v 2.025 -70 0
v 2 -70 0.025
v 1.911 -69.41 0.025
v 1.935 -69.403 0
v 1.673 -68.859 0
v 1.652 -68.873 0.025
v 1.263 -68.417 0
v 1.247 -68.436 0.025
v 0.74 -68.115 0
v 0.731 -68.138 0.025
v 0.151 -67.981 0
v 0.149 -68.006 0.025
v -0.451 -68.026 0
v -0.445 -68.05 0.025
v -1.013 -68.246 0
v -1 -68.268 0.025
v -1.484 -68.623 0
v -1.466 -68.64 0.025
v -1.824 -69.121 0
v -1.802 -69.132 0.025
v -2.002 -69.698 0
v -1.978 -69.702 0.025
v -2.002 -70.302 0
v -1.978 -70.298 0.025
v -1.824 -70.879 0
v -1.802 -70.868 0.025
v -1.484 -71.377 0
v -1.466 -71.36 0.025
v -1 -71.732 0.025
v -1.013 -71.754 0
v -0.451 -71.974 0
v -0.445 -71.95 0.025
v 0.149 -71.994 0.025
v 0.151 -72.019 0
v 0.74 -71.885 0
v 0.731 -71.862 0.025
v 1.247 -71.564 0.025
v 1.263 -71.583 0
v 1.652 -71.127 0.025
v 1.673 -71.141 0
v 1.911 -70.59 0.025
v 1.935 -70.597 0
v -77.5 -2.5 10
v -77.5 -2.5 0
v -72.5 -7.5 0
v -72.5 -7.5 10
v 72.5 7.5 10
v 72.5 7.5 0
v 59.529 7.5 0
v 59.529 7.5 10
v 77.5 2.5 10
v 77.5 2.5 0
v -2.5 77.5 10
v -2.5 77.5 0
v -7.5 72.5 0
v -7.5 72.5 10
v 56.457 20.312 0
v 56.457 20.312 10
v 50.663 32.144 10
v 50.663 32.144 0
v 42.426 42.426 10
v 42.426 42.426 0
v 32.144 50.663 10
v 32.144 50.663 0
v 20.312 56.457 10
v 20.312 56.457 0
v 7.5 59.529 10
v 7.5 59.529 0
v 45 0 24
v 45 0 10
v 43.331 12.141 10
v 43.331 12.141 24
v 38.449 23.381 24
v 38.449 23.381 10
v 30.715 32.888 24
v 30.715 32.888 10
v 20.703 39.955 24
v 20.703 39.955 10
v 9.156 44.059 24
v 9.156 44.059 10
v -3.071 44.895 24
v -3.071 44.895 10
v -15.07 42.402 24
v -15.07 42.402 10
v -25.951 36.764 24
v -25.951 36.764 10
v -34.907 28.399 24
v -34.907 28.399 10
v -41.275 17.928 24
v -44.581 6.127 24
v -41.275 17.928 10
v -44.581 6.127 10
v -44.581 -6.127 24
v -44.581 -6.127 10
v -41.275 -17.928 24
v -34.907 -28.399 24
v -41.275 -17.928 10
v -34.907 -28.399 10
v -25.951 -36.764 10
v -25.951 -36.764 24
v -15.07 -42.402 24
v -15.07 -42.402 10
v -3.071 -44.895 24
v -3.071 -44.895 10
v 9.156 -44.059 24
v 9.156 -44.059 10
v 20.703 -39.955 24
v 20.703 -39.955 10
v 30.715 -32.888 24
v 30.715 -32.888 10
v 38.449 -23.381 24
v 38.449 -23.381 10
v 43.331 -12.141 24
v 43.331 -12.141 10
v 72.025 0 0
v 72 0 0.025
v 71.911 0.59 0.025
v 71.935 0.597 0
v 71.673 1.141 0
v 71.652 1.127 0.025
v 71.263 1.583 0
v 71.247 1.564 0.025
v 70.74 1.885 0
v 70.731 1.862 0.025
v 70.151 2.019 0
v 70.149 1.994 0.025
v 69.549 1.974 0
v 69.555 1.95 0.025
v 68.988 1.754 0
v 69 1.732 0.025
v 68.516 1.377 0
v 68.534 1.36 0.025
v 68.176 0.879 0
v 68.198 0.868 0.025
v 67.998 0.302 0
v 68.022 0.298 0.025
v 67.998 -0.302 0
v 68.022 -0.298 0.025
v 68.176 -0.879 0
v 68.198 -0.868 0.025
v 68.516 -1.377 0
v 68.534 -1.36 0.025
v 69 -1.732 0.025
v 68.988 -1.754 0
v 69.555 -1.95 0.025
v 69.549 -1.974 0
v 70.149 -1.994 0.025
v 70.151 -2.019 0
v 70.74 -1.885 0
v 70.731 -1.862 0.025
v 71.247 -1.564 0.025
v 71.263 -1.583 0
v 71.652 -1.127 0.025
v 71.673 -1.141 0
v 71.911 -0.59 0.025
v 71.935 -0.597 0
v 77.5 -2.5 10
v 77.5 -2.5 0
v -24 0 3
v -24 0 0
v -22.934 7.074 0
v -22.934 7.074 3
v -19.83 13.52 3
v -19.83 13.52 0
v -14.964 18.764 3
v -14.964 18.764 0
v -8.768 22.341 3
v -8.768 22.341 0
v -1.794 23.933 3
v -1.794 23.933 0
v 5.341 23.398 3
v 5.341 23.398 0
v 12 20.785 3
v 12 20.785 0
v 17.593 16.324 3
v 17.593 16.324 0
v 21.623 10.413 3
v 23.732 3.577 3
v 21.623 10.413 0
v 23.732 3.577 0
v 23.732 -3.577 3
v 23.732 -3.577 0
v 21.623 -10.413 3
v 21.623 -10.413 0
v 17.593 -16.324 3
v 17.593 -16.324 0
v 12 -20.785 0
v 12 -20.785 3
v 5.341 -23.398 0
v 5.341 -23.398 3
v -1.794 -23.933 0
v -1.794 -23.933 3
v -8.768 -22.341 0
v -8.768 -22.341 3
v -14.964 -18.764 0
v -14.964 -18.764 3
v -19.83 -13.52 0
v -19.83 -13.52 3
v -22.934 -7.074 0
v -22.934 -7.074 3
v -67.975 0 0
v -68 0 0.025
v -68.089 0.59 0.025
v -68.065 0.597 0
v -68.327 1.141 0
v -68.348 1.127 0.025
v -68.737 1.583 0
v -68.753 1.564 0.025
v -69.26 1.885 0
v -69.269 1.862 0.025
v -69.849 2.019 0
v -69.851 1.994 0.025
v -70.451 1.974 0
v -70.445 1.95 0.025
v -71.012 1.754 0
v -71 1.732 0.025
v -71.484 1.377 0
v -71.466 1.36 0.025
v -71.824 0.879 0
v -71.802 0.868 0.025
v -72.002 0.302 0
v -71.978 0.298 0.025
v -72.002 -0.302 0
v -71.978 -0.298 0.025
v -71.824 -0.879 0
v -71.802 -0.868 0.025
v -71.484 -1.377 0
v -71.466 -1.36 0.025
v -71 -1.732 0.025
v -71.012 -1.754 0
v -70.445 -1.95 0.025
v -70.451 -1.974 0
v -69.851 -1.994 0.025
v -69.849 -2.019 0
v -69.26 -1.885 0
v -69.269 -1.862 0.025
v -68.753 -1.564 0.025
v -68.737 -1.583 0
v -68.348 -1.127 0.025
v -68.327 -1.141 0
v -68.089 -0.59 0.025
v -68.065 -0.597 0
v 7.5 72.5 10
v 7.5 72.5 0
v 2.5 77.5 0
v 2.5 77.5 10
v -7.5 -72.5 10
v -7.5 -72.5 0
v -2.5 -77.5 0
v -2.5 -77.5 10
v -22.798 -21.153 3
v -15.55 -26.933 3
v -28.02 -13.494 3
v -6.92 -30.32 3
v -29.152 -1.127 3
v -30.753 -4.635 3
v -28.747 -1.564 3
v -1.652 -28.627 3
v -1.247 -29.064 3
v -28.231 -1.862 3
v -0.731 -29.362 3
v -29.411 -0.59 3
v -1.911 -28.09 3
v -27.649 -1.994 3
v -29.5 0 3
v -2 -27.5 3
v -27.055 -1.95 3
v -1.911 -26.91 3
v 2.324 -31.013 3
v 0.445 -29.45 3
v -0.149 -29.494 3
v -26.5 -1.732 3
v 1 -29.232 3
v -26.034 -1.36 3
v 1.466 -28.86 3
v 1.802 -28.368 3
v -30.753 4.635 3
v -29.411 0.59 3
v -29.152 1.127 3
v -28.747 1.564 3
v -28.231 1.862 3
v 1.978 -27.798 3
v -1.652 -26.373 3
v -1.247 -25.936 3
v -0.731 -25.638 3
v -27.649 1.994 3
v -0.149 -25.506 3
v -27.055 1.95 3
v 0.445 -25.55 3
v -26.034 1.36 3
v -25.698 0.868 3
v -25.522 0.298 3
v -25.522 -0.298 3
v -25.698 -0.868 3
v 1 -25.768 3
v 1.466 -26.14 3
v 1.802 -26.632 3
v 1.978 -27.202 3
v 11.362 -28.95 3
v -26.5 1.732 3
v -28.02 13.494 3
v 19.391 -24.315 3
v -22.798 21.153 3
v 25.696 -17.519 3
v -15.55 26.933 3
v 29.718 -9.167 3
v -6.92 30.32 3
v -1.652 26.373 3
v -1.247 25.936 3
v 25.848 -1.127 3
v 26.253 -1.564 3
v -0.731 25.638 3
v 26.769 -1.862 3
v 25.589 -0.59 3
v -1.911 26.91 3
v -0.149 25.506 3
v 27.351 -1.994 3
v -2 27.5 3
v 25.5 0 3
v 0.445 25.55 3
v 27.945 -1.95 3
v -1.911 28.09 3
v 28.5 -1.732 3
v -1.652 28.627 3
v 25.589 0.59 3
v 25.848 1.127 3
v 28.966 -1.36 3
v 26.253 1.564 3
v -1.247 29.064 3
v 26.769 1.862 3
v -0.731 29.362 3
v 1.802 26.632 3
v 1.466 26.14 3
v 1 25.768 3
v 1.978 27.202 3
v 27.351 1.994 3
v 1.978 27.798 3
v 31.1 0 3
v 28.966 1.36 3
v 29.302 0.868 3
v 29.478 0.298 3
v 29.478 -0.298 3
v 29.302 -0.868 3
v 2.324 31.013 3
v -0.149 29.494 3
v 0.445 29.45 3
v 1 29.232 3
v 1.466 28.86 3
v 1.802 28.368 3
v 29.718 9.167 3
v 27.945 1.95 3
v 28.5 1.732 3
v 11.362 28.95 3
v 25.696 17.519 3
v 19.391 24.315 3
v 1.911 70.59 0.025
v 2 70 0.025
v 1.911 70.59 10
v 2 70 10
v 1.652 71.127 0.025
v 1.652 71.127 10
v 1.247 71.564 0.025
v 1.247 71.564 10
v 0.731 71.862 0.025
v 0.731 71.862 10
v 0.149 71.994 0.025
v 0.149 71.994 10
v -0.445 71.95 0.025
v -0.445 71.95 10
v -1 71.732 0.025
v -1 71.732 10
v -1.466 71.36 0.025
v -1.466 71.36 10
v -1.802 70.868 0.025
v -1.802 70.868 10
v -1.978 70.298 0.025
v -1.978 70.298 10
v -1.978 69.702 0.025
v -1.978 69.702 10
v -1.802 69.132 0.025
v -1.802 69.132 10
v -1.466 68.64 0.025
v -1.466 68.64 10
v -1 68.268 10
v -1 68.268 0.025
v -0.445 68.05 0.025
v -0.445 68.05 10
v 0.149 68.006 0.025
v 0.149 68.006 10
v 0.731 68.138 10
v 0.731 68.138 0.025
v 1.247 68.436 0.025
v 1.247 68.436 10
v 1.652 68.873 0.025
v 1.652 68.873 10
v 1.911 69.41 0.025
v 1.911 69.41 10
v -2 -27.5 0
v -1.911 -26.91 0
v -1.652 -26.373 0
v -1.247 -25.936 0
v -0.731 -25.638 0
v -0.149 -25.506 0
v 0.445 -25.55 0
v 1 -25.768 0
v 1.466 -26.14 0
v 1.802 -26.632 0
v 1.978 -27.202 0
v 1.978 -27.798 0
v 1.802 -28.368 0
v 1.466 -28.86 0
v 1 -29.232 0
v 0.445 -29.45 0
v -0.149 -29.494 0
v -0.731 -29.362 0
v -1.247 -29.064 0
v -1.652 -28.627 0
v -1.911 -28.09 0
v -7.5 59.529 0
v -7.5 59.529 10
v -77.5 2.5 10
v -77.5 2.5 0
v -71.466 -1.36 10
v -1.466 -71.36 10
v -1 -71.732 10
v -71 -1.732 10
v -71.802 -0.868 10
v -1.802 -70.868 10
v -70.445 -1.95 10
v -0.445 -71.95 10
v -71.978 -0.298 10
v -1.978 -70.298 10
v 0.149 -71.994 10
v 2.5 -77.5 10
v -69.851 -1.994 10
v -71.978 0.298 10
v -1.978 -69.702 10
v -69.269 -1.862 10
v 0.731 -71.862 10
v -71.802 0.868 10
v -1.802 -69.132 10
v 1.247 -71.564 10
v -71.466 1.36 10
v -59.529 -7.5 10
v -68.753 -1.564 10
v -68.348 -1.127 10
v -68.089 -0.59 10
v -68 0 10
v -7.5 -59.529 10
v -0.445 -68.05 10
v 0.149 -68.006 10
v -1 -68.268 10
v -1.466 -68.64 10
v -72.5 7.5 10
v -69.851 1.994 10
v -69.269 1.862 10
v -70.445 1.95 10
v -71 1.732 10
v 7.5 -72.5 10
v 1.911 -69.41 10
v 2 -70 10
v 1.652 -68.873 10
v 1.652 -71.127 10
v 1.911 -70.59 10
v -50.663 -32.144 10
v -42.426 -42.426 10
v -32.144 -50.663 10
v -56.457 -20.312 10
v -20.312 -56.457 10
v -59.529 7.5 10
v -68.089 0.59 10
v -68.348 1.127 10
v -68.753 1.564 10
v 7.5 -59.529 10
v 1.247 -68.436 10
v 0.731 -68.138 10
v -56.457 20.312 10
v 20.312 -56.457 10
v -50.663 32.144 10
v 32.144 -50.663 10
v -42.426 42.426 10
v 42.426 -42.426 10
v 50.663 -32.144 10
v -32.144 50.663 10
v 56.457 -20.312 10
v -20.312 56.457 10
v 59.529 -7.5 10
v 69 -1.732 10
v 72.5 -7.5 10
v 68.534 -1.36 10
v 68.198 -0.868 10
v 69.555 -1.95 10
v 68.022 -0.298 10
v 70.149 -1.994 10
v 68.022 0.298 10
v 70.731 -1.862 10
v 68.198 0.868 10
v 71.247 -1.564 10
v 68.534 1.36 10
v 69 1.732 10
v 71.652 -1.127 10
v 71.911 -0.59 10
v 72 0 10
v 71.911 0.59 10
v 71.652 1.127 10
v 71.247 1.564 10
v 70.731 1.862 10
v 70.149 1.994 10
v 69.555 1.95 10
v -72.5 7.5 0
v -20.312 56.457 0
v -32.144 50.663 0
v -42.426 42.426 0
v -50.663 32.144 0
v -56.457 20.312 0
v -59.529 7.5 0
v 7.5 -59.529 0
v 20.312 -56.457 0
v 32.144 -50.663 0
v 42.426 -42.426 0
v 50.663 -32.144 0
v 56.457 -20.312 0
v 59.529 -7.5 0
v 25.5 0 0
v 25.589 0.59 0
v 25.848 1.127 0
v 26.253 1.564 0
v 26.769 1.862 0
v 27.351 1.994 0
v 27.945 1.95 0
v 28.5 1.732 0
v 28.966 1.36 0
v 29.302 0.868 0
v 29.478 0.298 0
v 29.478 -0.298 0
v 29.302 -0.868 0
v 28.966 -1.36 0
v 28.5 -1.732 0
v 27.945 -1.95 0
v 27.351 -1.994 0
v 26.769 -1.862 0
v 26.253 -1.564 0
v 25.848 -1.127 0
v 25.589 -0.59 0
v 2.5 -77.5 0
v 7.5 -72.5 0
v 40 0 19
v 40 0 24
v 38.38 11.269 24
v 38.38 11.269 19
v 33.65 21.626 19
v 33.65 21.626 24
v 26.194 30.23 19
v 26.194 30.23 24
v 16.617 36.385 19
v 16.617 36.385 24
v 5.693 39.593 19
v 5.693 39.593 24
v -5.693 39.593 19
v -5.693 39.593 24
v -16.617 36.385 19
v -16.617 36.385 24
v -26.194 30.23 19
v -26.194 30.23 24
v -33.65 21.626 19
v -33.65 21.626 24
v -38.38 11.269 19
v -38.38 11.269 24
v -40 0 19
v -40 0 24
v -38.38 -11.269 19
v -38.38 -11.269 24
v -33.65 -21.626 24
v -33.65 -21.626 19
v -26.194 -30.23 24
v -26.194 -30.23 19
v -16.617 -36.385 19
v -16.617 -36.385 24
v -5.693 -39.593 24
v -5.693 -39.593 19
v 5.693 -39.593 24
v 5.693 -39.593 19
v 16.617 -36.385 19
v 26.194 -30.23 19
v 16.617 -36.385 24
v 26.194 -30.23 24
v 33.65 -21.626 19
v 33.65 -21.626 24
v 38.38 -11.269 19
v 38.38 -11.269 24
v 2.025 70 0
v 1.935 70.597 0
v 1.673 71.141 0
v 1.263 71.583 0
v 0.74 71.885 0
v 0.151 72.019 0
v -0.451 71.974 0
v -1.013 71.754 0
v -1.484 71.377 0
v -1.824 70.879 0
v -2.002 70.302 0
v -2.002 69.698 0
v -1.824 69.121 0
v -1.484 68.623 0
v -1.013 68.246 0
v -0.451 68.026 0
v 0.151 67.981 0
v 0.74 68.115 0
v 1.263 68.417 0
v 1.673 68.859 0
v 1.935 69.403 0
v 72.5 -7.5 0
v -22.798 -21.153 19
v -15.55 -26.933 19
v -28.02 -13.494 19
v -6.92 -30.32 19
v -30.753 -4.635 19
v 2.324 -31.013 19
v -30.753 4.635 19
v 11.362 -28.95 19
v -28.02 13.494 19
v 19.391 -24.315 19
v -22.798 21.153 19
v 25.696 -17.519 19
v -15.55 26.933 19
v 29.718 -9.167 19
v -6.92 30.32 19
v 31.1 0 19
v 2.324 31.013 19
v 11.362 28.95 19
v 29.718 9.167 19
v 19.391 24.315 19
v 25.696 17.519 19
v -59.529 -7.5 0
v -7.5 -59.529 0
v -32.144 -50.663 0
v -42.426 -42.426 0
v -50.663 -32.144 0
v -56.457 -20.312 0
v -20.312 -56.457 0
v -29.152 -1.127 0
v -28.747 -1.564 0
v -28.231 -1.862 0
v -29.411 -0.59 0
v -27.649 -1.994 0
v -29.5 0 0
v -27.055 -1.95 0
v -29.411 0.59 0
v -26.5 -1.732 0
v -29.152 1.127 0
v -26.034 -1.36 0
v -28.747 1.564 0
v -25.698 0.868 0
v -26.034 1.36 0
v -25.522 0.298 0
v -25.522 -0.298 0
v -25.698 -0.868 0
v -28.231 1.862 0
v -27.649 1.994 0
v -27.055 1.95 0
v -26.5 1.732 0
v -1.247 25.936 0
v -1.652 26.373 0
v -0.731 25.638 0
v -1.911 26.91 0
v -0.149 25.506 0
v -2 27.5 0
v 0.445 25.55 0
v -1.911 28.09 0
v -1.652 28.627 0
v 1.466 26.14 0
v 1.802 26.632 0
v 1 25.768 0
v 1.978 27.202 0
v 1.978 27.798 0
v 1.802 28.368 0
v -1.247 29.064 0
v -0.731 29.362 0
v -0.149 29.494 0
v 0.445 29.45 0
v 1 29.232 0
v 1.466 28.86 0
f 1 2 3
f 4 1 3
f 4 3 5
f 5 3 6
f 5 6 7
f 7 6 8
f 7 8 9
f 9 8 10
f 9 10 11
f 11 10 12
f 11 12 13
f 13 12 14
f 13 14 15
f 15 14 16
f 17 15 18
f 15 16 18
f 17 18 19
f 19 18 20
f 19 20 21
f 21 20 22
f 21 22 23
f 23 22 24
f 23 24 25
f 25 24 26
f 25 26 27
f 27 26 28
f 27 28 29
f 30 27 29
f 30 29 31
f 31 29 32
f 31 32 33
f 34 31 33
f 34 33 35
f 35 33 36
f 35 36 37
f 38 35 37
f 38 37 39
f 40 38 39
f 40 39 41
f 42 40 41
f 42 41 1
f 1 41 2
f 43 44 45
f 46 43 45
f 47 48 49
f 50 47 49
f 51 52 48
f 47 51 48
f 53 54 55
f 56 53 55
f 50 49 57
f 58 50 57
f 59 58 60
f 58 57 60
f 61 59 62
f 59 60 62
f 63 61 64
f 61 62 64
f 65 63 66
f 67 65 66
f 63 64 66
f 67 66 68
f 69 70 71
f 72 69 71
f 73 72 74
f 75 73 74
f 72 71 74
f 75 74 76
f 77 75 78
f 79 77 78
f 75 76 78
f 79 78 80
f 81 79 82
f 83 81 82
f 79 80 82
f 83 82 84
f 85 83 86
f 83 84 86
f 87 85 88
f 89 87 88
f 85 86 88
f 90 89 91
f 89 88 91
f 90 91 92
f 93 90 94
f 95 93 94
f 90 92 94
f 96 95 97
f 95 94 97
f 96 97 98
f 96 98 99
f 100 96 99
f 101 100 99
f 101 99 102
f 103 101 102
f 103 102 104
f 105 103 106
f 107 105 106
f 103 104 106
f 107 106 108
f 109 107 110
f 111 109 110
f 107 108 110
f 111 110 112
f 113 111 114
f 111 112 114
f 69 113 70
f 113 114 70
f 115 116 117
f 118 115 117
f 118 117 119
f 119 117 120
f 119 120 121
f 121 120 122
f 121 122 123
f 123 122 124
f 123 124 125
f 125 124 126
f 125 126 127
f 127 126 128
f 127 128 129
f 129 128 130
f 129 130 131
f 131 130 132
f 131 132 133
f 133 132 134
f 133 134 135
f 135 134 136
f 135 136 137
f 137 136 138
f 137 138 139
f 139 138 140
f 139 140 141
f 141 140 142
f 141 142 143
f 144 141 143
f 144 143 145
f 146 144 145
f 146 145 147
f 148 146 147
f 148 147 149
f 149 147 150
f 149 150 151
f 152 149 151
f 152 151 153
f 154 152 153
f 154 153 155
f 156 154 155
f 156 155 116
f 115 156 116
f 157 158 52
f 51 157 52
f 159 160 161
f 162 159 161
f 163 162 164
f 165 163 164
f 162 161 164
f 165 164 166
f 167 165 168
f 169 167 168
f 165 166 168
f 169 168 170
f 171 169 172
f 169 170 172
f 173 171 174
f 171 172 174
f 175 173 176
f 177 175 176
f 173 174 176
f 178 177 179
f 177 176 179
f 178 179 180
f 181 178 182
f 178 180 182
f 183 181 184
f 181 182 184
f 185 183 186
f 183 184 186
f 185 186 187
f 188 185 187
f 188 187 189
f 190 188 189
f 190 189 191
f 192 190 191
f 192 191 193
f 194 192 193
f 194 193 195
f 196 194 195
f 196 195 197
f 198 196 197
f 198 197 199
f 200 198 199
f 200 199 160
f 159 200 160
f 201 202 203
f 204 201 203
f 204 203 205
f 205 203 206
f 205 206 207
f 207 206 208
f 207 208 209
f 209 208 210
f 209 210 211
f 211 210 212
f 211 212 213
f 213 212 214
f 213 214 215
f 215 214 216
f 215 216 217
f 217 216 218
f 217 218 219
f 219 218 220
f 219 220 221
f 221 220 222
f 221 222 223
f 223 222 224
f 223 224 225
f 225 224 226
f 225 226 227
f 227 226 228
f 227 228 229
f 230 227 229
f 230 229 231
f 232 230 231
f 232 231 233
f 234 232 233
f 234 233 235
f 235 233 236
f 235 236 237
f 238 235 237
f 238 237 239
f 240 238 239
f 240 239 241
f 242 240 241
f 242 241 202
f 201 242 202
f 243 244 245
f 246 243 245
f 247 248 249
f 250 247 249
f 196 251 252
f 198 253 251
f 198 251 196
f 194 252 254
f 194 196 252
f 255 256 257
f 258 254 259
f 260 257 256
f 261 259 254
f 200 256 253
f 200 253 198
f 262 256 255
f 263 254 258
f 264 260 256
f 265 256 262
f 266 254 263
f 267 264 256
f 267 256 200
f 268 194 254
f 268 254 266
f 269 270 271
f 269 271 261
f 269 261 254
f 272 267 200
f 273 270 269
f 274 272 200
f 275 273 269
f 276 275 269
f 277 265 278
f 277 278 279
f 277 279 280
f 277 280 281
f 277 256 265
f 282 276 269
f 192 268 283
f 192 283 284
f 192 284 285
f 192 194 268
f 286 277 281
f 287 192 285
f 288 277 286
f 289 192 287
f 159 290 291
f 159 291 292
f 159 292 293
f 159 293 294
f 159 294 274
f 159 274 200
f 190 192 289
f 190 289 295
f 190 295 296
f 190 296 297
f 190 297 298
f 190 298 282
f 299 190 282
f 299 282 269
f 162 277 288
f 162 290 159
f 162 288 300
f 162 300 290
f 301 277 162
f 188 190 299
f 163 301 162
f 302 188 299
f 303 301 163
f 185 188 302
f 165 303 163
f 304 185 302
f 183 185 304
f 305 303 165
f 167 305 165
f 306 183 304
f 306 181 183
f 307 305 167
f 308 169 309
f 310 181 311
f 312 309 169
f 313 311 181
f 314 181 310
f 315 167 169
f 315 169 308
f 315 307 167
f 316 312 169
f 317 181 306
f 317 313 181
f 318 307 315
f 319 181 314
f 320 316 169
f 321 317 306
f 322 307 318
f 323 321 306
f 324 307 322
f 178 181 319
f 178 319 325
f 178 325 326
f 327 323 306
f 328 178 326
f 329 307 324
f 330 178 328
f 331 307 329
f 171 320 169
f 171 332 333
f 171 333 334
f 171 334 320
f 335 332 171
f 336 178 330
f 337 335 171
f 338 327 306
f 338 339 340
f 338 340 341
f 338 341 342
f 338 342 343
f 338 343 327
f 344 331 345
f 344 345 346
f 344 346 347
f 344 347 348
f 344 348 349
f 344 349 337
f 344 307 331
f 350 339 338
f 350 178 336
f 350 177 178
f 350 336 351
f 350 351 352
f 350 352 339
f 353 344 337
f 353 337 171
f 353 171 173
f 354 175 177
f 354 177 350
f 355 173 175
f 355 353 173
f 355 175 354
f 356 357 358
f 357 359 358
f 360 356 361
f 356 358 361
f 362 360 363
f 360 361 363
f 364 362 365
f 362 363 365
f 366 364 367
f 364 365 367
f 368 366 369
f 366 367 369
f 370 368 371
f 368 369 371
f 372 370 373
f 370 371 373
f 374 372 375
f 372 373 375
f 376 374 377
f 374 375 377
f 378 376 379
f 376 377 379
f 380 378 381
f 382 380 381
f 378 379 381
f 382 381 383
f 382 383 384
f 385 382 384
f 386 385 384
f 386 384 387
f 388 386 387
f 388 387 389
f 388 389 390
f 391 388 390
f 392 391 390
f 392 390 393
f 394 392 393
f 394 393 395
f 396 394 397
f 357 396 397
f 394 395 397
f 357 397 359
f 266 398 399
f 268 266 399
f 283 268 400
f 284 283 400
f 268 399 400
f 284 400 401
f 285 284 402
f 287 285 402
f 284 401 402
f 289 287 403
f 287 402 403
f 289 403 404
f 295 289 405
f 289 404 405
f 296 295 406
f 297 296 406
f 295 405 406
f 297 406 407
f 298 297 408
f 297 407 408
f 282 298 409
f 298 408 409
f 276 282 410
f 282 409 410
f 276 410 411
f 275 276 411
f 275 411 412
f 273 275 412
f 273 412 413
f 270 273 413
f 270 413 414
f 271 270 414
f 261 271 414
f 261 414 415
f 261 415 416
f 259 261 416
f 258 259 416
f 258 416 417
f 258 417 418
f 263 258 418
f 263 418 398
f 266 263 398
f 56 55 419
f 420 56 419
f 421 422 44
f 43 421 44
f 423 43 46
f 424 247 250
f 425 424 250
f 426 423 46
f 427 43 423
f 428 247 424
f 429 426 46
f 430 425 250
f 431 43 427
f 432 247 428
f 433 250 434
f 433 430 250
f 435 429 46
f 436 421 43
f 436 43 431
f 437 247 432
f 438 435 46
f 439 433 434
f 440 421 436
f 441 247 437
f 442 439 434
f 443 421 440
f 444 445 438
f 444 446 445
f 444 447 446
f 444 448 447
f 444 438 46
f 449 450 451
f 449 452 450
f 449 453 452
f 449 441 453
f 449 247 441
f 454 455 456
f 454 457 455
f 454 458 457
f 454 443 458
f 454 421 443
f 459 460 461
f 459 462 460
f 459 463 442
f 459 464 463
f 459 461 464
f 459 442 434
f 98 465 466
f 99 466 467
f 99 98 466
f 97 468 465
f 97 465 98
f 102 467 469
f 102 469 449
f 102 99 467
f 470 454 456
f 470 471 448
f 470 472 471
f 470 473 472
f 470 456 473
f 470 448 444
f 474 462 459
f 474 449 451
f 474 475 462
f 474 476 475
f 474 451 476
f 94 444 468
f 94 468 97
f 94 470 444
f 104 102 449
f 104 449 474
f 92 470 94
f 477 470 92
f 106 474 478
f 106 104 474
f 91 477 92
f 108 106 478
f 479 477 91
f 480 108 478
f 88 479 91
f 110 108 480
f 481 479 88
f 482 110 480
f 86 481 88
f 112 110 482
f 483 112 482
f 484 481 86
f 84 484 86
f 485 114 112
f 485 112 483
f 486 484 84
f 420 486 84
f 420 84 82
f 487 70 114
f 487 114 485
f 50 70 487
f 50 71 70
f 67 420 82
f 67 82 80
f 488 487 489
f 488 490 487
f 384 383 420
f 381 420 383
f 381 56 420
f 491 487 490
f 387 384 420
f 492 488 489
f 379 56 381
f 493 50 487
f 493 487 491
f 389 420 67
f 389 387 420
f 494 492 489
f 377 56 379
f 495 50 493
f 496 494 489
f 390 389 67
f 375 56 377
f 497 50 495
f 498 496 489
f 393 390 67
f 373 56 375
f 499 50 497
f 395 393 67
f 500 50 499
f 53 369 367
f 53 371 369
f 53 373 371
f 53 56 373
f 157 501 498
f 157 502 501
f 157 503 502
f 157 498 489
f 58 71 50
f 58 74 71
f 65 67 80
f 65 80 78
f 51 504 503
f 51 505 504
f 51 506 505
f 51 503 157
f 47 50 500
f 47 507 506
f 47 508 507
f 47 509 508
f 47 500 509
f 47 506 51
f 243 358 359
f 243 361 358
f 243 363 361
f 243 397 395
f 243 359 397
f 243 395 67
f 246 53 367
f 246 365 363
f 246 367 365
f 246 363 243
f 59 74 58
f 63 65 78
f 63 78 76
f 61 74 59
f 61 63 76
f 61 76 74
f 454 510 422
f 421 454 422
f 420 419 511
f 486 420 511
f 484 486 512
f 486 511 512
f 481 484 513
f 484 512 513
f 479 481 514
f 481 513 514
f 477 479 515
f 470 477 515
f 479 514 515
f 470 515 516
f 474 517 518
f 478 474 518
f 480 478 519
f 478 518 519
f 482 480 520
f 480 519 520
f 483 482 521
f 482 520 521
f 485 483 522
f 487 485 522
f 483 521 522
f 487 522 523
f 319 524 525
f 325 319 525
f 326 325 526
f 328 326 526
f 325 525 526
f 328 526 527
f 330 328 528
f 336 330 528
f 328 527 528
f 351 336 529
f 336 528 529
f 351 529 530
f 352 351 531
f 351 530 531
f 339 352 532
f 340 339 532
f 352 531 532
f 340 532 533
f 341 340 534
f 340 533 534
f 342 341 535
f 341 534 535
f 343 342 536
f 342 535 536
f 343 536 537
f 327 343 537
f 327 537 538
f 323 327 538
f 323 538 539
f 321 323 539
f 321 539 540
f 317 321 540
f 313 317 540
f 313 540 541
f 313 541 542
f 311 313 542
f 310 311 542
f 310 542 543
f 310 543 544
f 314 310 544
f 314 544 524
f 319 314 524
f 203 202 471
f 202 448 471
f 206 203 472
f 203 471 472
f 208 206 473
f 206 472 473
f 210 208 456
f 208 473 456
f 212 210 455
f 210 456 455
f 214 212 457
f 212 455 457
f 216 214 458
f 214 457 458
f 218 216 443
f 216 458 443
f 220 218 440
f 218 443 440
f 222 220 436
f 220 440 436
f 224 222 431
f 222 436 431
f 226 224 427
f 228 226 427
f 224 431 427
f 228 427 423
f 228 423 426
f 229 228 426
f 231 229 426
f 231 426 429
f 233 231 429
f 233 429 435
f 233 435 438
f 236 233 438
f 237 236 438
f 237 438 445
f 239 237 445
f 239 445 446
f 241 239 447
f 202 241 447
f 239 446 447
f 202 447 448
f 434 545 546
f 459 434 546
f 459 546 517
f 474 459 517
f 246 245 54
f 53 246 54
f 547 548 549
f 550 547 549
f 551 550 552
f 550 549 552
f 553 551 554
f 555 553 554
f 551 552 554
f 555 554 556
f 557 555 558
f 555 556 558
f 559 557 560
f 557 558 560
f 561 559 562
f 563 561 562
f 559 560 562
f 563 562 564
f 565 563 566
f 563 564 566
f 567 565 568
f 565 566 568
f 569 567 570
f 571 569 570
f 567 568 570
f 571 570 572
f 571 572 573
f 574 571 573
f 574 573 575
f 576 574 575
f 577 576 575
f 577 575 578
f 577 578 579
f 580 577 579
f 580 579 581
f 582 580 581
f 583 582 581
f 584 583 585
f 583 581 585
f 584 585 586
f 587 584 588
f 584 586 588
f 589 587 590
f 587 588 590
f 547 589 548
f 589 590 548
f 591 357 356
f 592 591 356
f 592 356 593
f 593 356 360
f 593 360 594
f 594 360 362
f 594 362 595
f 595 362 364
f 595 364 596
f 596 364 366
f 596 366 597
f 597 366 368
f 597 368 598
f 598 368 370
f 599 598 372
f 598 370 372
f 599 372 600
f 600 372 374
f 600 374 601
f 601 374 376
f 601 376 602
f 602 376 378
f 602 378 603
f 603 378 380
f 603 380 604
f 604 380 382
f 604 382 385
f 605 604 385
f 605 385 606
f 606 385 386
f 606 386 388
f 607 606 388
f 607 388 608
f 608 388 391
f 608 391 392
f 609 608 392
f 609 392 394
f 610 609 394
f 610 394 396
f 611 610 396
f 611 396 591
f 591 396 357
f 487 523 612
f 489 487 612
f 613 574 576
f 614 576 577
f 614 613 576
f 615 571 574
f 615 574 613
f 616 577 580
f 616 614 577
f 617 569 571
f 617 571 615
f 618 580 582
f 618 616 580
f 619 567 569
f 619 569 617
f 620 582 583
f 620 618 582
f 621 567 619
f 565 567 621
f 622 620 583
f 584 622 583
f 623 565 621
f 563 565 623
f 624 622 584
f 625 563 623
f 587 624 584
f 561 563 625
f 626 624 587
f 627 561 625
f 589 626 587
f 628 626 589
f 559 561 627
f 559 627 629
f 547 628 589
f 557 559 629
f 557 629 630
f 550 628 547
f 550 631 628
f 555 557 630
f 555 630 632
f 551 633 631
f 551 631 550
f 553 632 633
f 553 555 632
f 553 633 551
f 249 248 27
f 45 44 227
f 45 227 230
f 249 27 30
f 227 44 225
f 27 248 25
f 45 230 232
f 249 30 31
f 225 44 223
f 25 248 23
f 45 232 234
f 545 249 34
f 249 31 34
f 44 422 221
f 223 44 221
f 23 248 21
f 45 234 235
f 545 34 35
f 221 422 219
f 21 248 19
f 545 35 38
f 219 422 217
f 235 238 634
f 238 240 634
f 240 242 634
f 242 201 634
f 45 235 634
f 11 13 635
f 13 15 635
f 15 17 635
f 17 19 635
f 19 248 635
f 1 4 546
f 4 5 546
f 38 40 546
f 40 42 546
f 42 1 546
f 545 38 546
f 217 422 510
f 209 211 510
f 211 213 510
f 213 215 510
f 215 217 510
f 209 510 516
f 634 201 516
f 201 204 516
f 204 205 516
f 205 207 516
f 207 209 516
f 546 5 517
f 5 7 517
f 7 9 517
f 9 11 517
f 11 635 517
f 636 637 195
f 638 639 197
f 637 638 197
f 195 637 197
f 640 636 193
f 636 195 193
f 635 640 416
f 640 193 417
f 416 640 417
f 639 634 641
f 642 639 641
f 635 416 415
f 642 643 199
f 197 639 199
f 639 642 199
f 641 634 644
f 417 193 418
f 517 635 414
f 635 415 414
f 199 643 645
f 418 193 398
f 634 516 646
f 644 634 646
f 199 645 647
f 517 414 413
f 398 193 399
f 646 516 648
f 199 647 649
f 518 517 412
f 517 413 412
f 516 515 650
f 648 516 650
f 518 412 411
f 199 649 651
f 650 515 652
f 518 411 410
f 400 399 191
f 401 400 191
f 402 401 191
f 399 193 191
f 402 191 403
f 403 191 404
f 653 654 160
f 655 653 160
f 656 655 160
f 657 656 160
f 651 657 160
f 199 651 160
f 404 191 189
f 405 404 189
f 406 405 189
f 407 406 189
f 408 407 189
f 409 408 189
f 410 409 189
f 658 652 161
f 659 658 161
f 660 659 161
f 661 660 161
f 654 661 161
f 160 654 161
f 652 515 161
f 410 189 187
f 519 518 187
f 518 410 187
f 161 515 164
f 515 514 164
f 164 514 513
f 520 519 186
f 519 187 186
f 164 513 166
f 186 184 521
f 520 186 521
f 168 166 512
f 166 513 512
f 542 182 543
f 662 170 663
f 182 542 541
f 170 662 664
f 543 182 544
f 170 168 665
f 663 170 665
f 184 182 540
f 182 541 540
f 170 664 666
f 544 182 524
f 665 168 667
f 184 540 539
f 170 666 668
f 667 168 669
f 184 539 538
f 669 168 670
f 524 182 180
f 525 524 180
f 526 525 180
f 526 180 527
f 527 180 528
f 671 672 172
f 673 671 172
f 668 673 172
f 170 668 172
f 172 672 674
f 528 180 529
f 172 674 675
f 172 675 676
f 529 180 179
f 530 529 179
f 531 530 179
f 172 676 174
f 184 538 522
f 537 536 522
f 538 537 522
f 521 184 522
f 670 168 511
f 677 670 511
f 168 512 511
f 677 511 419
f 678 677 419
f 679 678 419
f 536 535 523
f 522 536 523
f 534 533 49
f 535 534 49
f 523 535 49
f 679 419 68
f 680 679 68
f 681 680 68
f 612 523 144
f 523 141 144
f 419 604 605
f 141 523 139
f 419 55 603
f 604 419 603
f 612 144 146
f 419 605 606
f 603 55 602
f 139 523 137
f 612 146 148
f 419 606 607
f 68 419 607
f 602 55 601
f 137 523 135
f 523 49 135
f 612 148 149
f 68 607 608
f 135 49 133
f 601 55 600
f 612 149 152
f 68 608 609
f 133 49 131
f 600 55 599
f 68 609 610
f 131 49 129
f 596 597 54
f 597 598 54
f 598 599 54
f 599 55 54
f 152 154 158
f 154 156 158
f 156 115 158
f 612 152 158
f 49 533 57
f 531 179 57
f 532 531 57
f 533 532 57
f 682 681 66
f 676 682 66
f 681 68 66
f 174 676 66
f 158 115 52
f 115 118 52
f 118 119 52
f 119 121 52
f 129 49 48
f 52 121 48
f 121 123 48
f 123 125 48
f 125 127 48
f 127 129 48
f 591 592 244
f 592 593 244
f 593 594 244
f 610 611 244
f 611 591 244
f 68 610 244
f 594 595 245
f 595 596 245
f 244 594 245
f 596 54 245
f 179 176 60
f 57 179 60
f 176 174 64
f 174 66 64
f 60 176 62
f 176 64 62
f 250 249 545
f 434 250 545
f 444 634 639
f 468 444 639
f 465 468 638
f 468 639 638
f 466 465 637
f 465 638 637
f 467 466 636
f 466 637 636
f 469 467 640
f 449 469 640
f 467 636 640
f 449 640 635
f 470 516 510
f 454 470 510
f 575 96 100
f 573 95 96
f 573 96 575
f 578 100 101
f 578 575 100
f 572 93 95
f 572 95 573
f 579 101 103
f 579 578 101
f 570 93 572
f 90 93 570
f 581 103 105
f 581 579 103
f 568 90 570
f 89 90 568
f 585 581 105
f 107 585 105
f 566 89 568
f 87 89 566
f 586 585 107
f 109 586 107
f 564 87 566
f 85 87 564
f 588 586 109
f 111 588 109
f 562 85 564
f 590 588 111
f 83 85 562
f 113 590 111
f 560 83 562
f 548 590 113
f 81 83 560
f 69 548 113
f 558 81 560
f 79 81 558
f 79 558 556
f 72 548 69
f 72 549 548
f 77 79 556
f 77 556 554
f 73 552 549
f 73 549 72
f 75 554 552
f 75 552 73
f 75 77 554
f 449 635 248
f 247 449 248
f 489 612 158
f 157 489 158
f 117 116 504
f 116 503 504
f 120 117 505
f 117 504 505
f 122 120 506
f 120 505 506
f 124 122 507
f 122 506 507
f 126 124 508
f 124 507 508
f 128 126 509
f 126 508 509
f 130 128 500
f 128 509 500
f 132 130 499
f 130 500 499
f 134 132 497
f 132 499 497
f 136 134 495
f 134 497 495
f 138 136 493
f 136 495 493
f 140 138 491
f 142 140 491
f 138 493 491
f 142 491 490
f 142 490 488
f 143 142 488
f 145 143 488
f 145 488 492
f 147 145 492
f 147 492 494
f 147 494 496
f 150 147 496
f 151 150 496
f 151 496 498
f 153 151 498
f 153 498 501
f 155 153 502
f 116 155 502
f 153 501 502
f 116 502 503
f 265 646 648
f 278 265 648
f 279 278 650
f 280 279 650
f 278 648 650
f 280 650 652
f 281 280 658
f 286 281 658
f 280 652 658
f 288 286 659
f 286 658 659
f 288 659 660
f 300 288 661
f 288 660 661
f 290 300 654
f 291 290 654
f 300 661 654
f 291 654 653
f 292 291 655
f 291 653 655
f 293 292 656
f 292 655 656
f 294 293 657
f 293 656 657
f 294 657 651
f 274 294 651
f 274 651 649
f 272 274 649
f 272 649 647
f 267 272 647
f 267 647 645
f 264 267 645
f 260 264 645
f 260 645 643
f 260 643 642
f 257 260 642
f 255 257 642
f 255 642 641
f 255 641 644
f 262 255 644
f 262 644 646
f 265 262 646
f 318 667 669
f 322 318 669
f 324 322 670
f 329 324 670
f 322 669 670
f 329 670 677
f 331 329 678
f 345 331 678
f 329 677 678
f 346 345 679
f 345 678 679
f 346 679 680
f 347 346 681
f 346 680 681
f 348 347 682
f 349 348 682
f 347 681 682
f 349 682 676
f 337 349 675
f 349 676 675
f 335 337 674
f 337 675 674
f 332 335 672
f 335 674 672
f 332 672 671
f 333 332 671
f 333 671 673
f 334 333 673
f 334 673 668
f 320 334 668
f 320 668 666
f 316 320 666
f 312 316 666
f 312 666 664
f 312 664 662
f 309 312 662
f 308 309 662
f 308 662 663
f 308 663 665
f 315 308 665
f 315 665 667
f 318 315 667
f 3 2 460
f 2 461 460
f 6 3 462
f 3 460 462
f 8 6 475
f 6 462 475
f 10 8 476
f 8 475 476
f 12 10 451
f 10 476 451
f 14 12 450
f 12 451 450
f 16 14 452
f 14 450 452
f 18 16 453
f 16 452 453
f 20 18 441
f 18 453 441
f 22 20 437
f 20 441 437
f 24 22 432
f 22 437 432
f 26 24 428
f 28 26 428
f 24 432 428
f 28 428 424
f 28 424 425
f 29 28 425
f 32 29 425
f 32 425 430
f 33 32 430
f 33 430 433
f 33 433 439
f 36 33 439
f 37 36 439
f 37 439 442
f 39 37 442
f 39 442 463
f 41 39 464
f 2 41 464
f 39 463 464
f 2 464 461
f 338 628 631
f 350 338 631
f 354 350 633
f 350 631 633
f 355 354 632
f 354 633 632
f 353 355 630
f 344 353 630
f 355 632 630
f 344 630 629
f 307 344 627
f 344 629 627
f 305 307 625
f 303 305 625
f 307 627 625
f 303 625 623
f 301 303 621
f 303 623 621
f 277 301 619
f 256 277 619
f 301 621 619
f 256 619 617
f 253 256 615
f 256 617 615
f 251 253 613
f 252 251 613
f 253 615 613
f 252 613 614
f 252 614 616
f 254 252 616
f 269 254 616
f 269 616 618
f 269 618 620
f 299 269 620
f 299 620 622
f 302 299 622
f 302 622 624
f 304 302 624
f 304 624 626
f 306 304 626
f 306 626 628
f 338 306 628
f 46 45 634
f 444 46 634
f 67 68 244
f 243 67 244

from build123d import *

# Parameters (mm, degrees)
BOSS_EXTRUDE1_DEPTH             = 10
SKETCH2_R                       = 45
BOSS_EXTRUDE2_DEPTH             = 14
SKETCH3_R                       = 31.1
CUT_EXTRUDE1_DEPTH              = 21
F_4_0MM_DOWEL_HOLE1_D           = 4
F_4_0MM_DOWEL_HOLE1_CSINK_D     = 4.05
F_4_0MM_DOWEL_HOLE1_CSINK_ANGLE = 90
SKETCH11_R                      = 40
CUT_EXTRUDE2_DEPTH              = 5
SKETCH4_R                       = 24
CUT_EXTRUDE3_DEPTH              = 4
SKETCH12_R                      = 2
CUT_EXTRUDE5_DEPTH              = 4


with BuildPart() as part:
    # Sketch1 → Boss-Extrude1 (new body)
    with BuildSketch(Plane.XY):
        with BuildLine():
            Line((-42.5, 7.5), (-59.529404499, 7.5))
            ThreePointArc((-59.529404499, 7.5), (-60, 0), (-59.529404499, -7.5))
            Line((-59.529404499, -7.5), (-42.5, -7.5))
            Line((-42.5, -7.5), (-42.5, 7.5))
        make_face()
        with BuildLine():
            ThreePointArc((-7.5, 59.529404499), (-42.426406871, 42.426406871), (-59.529404499, 7.5))
            Line((-59.529404499, 7.5), (-42.5, 7.5))
            Line((-42.5, 7.5), (-42.5, -7.5))
            Line((-42.5, -7.5), (-59.529404499, -7.5))
            ThreePointArc((-59.529404499, -7.5), (-42.426406871, -42.426406871), (-7.5, -59.529404499))
            Line((-7.5, -59.529404499), (-7.5, -42.5))
            Line((-7.5, -42.5), (7.5, -42.5))
            Line((7.5, -42.5), (7.5, -59.529404499))
            ThreePointArc((7.5, -59.529404499), (42.426406871, -42.426406871), (59.529404499, -7.5))
            Line((59.529404499, -7.5), (42.5, -7.5))
            Line((42.5, -7.5), (42.5, 7.5))
            Line((42.5, 7.5), (59.529404499, 7.5))
            ThreePointArc((59.529404499, 7.5), (42.426406871, 42.426406871), (7.5, 59.529404499))
            Line((7.5, 59.529404499), (7.5, 42.5))
            Line((7.5, 42.5), (-7.5, 42.5))
            Line((-7.5, 42.5), (-7.5, 59.529404499))
        make_face()
        with BuildLine():
            ThreePointArc((7.5, 59.529404499), (0, 60), (-7.5, 59.529404499))
            Line((-7.5, 59.529404499), (-7.5, 42.5))
            Line((-7.5, 42.5), (7.5, 42.5))
            Line((7.5, 42.5), (7.5, 59.529404499))
        make_face()
        with BuildLine():
            Line((-7.5, 72.5), (-7.5, 59.529404499))
            ThreePointArc((-7.5, 59.529404499), (0, 60), (7.5, 59.529404499))
            Line((7.5, 59.529404499), (7.5, 72.5))
            Line((7.5, 72.5), (2.5, 77.5))
            Line((2.5, 77.5), (-2.5, 77.5))
            Line((-2.5, 77.5), (-7.5, 72.5))
        make_face()
        with BuildLine():
            Line((-59.529404499, 7.5), (-72.5, 7.5))
            Line((-72.5, 7.5), (-77.5, 2.5))
            Line((-77.5, 2.5), (-77.5, -2.5))
            Line((-77.5, -2.5), (-72.5, -7.5))
            Line((-72.5, -7.5), (-59.529404499, -7.5))
            ThreePointArc((-59.529404499, -7.5), (-60, 0), (-59.529404499, 7.5))
        make_face()
        with BuildLine():
            ThreePointArc((60, 0), (59.882235554, 3.757374753), (59.529404499, 7.5))
            Line((59.529404499, 7.5), (42.5, 7.5))
            Line((42.5, 7.5), (42.5, -7.5))
            Line((42.5, -7.5), (59.529404499, -7.5))
            ThreePointArc((59.529404499, -7.5), (59.882235554, -3.757374753), (60, 0))
        make_face()
        with BuildLine():
            Line((72.5, 7.5), (59.529404499, 7.5))
            ThreePointArc((59.529404499, 7.5), (59.882235554, 3.757374753), (60, 0))
            ThreePointArc((60, 0), (59.882235554, -3.757374753), (59.529404499, -7.5))
            Line((59.529404499, -7.5), (72.5, -7.5))
            Line((72.5, -7.5), (77.5, -2.5))
            Line((77.5, -2.5), (77.5, 2.5))
            Line((77.5, 2.5), (72.5, 7.5))
        make_face()
        with BuildLine():
            ThreePointArc((7.5, -59.529404499), (0, -60), (-7.5, -59.529404499))
            Line((-7.5, -59.529404499), (-7.5, -72.5))
            Line((-7.5, -72.5), (-2.5, -77.5))
            Line((-2.5, -77.5), (2.5, -77.5))
            Line((2.5, -77.5), (7.5, -72.5))
            Line((7.5, -72.5), (7.5, -59.529404499))
        make_face()
        with BuildLine():
            Line((-7.5, -42.5), (-7.5, -59.529404499))
            ThreePointArc((-7.5, -59.529404499), (0, -60), (7.5, -59.529404499))
            Line((7.5, -59.529404499), (7.5, -42.5))
            Line((7.5, -42.5), (-7.5, -42.5))
        make_face()
    extrude(amount=BOSS_EXTRUDE1_DEPTH)

    # Sketch2 → Boss-Extrude2 (add)
    with BuildSketch(Plane.XY.offset(10)):
        Circle(SKETCH2_R)
    extrude(amount=BOSS_EXTRUDE2_DEPTH)

    # Sketch3 → Cut-Extrude1 (cut)
    with BuildSketch(Plane.XY.offset(24)):
        Circle(SKETCH3_R)
    extrude(amount=-CUT_EXTRUDE1_DEPTH, mode=Mode.SUBTRACT)

    # Ø4.0mm Dowel Hole1 (through all)
    with Locations(Plane(origin=(0, 0, 0), x_dir=(-1, 0, 0), z_dir=(0, 0, -1))):
        with Locations((-70, 0), (0, 70), (70, 0), (0, -70)):
            CounterSinkHole(F_4_0MM_DOWEL_HOLE1_D / 2, F_4_0MM_DOWEL_HOLE1_CSINK_D / 2, counter_sink_angle=F_4_0MM_DOWEL_HOLE1_CSINK_ANGLE)

    # Sketch11 → Cut-Extrude2 (cut)
    with BuildSketch(Plane.XY.offset(24)):
        Circle(SKETCH11_R)
    extrude(amount=-CUT_EXTRUDE2_DEPTH, mode=Mode.SUBTRACT)

    # Sketch4 → Cut-Extrude3 (cut)
    with BuildSketch(Plane(origin=(0, 0, 0), x_dir=(-1, 0, 0), z_dir=(0, 0, -1))):
        Circle(SKETCH4_R)
    extrude(amount=-CUT_EXTRUDE3_DEPTH, mode=Mode.SUBTRACT)

    # Sketch12 → Cut-Extrude5 (cut)
    with BuildSketch(Plane(origin=(0, 0, 0), x_dir=(-1, 0, 0), z_dir=(0, 0, -1))):
        with Locations((27.5, 0)):
            Circle(SKETCH12_R)
        with Locations((0, -27.5)):
            Circle(SKETCH12_R)
        with Locations((-27.5, 0)):
            Circle(SKETCH12_R)
        with Locations((0, 27.5)):
            Circle(SKETCH12_R)
    extrude(amount=-CUT_EXTRUDE5_DEPTH, mode=Mode.SUBTRACT)


solid = part.part
